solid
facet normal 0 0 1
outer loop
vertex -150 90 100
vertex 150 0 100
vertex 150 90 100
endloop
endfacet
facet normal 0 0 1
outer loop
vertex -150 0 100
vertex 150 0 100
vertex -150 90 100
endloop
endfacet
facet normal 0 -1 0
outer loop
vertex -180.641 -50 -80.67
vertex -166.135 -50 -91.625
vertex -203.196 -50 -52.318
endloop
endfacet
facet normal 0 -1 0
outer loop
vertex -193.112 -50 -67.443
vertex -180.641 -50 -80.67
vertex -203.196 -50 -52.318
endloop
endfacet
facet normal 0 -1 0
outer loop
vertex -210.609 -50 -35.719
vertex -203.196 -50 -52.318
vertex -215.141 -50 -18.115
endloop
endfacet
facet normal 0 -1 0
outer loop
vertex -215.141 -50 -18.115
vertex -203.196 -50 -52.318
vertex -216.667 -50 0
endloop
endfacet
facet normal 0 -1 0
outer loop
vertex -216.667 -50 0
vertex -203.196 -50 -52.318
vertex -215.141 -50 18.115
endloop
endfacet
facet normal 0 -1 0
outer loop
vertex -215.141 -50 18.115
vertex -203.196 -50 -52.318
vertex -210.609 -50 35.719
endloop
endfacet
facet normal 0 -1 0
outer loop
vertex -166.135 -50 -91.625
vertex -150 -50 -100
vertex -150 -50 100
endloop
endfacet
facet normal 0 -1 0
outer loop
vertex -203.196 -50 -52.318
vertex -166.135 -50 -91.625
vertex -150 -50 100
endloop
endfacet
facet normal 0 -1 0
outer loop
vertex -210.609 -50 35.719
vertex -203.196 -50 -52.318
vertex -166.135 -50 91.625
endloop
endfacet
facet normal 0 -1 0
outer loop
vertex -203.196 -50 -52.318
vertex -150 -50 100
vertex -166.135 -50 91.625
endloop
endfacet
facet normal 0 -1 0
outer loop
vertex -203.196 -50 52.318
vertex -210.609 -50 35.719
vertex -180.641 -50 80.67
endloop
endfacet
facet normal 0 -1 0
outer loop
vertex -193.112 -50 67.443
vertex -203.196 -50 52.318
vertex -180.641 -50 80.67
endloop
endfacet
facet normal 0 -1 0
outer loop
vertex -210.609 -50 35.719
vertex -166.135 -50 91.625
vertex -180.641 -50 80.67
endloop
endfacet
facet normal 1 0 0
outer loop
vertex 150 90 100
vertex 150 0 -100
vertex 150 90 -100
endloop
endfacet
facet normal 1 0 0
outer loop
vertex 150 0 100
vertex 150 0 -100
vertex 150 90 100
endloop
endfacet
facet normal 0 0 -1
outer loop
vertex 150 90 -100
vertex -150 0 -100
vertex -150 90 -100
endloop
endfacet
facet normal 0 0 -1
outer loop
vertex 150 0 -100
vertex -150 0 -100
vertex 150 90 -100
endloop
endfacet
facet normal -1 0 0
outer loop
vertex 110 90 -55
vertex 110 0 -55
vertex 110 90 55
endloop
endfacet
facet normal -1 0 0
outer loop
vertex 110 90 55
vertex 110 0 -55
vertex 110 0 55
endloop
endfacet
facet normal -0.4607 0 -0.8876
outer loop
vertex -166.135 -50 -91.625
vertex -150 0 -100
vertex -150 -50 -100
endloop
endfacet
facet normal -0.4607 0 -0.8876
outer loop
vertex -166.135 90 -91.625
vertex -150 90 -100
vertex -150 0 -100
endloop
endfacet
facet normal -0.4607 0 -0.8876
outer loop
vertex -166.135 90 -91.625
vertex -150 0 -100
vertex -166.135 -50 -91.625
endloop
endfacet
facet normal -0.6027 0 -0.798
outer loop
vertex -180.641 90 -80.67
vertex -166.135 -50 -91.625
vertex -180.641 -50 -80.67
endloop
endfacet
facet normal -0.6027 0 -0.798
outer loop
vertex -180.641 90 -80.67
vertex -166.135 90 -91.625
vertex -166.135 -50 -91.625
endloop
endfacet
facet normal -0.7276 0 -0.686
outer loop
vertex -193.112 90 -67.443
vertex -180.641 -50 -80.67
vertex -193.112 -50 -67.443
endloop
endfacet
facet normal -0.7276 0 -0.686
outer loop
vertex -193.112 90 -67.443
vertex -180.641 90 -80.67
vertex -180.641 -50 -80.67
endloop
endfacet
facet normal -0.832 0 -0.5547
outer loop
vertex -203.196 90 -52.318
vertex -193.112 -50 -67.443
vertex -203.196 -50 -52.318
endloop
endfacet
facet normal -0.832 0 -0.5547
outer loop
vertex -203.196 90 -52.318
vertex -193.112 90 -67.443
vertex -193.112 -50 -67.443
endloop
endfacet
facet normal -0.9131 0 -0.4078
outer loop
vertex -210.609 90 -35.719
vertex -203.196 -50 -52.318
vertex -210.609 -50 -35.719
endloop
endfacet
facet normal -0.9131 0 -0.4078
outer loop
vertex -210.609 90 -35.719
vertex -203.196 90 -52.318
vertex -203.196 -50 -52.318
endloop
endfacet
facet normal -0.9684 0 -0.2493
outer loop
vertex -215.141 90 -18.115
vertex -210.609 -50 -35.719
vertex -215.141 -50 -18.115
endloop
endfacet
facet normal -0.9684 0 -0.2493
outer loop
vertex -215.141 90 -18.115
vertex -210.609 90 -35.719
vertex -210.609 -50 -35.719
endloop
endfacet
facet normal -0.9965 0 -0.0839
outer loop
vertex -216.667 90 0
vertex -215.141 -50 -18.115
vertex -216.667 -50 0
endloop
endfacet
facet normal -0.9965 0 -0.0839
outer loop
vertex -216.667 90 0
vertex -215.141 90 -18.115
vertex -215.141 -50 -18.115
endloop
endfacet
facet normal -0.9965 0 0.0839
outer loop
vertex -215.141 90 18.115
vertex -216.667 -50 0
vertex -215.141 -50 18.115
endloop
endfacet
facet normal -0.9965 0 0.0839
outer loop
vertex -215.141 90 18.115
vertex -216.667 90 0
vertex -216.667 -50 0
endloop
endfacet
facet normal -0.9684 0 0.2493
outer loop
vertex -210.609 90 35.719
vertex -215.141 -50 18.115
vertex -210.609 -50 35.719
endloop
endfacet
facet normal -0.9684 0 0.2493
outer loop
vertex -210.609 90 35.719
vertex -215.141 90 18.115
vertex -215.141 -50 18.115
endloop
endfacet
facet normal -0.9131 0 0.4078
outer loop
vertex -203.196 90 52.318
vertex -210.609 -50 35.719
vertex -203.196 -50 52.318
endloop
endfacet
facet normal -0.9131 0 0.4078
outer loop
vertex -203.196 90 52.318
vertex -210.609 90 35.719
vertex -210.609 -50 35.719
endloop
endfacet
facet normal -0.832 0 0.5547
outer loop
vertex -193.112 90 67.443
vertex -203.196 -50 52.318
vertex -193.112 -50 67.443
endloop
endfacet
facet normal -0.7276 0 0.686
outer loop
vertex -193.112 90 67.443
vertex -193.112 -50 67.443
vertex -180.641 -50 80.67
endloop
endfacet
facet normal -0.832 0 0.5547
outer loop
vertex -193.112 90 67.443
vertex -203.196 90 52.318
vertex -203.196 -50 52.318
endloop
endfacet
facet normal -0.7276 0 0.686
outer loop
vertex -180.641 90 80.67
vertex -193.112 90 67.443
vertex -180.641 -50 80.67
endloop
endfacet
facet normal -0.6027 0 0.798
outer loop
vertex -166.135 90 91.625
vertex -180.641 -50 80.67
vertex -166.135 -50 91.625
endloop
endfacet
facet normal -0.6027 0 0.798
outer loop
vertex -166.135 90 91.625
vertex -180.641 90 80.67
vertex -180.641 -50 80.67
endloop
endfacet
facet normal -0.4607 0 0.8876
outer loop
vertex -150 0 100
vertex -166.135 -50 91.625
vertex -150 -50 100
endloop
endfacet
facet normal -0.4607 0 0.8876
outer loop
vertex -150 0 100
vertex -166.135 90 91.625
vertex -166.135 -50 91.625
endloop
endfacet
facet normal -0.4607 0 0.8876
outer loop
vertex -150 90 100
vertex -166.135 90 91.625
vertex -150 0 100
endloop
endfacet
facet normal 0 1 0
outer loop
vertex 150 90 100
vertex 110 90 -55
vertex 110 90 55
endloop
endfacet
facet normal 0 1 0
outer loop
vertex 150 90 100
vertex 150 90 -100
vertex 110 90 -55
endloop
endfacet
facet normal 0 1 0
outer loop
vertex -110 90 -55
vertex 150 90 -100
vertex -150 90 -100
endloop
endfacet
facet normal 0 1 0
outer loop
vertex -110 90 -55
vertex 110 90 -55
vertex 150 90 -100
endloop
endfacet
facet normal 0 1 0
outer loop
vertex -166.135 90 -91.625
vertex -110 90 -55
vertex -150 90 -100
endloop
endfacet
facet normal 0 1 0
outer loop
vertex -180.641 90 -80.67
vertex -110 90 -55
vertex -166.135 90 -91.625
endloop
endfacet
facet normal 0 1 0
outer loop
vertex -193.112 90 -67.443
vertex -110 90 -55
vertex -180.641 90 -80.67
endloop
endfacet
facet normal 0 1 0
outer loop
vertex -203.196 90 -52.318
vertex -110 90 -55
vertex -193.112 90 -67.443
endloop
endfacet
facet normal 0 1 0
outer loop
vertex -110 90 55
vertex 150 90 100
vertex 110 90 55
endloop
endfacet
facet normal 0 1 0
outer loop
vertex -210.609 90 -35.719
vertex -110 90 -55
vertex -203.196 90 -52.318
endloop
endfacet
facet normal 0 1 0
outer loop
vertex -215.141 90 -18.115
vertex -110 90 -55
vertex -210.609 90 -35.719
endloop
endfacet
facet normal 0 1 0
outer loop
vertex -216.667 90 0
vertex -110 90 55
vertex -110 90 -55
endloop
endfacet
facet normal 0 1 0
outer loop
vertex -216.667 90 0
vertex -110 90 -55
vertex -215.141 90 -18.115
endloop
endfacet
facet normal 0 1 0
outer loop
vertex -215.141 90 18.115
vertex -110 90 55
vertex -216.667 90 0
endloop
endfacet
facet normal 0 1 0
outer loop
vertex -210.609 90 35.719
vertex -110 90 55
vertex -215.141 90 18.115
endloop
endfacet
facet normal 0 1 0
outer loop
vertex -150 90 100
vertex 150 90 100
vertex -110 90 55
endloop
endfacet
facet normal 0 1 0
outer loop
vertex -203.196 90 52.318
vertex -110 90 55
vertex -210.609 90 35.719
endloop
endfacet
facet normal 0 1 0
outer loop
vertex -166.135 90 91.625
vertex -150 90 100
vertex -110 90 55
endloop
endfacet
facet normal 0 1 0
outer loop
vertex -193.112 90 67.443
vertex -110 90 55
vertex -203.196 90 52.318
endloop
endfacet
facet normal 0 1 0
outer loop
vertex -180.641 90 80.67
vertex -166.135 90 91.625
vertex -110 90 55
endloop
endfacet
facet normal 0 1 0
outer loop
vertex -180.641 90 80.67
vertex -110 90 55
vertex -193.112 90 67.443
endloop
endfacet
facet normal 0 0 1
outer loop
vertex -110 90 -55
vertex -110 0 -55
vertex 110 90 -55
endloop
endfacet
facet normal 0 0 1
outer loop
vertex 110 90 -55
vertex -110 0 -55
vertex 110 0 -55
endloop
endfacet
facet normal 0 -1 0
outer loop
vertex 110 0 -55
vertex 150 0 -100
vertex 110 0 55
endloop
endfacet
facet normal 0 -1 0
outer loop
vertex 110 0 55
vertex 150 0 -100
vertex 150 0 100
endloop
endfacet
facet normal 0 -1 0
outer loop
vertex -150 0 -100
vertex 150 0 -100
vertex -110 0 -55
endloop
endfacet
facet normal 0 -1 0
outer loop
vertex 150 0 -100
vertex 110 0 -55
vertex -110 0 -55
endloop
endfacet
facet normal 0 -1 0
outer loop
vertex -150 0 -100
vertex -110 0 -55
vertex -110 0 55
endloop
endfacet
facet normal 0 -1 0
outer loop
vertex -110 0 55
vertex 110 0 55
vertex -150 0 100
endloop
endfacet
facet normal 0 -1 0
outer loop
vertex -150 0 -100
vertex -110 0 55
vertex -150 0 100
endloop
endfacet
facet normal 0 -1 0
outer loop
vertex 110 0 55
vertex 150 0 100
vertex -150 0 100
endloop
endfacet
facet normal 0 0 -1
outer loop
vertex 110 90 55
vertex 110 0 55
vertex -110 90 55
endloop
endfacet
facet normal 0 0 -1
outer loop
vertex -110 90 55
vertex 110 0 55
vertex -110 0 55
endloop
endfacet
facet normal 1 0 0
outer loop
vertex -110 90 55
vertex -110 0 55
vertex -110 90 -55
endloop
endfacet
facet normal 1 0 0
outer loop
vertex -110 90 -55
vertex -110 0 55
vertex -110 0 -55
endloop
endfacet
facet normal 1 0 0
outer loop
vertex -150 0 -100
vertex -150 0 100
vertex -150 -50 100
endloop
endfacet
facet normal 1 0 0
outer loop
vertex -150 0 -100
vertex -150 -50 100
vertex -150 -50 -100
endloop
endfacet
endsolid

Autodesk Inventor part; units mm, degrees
ref_plane "YZ Plane" through (0, 0, 0) normal (1, 0, 0) x (0, 1, 0)
ref_plane "XZ Plane" through (0, 0, 0) normal (0, 1, 0) x (-1, 0, 0)
ref_plane "XY Plane" through (0, 0, 0) normal (0, 0, 1) x (1, 0, 0)
sketch "Sketch1" plane through (0, 0, 0) normal (0, 1, 0) x (-1, 0, 0)
  line L0 (-110, 55) -> (110, 55)
  line L1 (110, 55) -> (110, -55)
  line L2 (110, -55) -> (-110, -55)
  line L3 (-110, -55) -> (-110, 55)
  line L4 (-110, 55) -> (110, -55) construction
  line L5 (110, 55) -> (-110, -55) construction
  line L6 (-150, 100) -> (150, 100)
  line L7 (150, 100) -> (150, -100)
  line L8 (150, -100) -> (-150, -100)
  line L9 (-150, -100) -> (-150, 100)
  line L10 (-150, 100) -> (150, -100) construction
  line L11 (150, 100) -> (-150, -100) construction
  arc A0 (150, -100) -> (150, 100) centre (108.3333, 0) ccw
  point P0 (0, 0)
  dimension "d0" = 220
  dimension "d1" = 110
  dimension "d2" = 300
  dimension "d3" = 200
extrude "Extrusion1" add sketch "Sketch1" along normal blind 90
extrude "Extrusion2" add sketch "Sketch1" against normal blind 50 contours A0 L7
properties part number "Sensor"
